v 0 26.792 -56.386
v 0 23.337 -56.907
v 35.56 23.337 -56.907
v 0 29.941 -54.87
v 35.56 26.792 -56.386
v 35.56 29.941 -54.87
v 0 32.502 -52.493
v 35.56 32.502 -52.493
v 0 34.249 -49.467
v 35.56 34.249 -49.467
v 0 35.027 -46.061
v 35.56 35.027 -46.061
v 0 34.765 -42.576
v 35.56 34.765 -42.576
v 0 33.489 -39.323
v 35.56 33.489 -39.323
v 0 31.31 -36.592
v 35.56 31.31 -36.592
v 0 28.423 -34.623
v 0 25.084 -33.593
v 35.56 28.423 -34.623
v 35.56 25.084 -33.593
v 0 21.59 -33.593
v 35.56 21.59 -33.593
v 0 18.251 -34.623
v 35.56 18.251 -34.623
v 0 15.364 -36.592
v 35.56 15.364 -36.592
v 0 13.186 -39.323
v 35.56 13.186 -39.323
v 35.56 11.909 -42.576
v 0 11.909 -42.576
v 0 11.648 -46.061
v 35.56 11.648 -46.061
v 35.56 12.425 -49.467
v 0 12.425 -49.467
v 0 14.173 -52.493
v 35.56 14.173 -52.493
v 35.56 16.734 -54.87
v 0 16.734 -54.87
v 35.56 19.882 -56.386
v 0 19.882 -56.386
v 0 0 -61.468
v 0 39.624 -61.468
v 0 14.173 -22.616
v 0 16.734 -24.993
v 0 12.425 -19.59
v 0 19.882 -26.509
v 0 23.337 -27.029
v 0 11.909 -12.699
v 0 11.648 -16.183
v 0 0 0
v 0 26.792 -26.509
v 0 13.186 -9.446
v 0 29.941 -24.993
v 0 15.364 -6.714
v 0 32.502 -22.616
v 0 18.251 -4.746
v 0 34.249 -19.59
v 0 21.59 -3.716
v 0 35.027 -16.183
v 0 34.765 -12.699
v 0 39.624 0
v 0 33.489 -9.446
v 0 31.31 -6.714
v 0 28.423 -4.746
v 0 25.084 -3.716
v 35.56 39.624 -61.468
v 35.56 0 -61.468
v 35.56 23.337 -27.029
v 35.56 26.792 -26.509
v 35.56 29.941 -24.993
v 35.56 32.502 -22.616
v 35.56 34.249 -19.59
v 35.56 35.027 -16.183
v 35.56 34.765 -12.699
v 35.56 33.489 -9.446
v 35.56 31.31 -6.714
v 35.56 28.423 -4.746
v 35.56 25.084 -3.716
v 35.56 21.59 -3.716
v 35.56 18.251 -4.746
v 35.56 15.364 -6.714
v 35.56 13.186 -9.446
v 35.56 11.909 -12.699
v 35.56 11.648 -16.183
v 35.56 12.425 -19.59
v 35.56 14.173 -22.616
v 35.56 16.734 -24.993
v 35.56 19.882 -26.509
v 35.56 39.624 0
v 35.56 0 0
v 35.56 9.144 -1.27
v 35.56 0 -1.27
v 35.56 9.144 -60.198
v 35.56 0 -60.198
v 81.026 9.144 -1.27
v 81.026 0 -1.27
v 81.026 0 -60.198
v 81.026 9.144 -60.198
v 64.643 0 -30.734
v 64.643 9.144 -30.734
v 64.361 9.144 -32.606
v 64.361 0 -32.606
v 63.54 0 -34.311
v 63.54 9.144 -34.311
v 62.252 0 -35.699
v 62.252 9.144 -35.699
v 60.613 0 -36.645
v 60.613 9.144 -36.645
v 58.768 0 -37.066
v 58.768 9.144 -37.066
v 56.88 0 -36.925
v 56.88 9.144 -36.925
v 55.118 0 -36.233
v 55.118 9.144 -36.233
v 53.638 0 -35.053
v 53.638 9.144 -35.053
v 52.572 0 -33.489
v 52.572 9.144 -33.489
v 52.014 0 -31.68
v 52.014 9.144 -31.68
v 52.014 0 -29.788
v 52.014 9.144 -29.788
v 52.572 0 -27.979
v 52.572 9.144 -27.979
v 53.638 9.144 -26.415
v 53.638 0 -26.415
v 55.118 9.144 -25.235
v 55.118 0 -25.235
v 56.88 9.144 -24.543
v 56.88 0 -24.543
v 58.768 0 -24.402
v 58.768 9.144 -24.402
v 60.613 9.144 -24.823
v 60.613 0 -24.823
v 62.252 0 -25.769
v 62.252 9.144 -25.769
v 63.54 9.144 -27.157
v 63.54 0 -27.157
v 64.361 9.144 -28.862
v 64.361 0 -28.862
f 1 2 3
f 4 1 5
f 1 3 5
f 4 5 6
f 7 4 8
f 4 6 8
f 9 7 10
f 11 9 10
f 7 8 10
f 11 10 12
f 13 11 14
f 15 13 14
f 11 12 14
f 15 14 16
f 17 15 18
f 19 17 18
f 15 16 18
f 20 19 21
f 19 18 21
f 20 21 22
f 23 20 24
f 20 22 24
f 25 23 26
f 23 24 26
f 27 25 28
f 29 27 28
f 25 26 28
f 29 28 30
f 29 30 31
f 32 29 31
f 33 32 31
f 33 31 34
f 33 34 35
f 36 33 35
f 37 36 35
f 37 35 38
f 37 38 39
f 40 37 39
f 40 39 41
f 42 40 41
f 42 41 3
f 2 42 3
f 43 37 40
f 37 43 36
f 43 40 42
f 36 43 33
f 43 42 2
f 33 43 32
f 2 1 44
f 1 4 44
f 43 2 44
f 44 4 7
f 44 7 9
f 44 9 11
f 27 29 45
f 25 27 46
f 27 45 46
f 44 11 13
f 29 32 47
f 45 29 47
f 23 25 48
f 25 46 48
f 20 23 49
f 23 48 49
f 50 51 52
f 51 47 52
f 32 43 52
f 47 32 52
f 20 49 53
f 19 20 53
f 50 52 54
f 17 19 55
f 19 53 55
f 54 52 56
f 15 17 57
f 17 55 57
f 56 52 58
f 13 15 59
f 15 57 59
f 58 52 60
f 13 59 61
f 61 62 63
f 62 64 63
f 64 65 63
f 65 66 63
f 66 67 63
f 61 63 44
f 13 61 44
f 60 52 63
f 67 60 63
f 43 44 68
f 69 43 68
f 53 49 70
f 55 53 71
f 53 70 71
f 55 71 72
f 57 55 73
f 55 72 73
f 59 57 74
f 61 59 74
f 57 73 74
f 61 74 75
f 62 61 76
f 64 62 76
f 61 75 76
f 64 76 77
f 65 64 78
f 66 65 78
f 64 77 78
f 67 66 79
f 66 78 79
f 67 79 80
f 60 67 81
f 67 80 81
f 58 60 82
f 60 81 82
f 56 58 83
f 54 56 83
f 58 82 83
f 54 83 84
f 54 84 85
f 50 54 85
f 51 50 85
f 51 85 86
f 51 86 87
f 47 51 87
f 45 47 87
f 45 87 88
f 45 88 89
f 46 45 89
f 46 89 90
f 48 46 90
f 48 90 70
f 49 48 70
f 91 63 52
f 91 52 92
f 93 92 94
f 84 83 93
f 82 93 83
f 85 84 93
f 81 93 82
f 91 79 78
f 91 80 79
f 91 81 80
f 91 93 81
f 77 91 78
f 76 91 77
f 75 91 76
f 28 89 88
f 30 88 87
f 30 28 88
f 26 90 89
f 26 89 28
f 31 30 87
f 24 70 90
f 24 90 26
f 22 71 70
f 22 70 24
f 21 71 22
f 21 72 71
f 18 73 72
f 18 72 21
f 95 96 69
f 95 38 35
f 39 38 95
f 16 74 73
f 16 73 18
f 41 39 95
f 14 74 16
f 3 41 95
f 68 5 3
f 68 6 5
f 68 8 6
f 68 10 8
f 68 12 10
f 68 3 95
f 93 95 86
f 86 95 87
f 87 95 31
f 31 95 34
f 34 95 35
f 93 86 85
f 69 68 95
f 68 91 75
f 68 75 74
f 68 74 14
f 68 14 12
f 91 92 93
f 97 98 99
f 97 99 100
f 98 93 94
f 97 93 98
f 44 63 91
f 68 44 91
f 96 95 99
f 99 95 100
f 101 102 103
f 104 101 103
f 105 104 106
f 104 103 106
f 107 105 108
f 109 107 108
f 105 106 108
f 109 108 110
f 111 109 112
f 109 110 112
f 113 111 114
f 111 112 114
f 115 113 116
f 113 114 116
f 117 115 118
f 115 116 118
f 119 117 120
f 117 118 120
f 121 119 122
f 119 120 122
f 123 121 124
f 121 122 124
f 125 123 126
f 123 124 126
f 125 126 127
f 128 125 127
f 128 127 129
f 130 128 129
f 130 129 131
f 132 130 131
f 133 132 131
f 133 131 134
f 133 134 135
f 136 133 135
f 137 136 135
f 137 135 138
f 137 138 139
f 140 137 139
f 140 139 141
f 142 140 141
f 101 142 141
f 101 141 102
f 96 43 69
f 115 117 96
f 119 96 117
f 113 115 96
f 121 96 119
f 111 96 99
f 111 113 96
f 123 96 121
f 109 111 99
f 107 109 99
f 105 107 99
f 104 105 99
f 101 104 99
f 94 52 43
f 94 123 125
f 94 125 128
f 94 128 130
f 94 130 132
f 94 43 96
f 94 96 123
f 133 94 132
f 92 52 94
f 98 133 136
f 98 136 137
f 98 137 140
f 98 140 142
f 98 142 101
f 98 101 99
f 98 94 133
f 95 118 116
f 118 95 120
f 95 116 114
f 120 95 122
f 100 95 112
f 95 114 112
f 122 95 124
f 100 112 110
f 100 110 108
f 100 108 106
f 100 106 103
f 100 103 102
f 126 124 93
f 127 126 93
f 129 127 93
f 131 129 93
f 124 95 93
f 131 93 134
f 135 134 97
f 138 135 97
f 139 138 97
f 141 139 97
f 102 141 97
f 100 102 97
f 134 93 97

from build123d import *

# Parameters (mm, degrees)
SKETCH1_W           = 81.026
SKETCH1_H           = 39.624
BOSS_EXTRUDE1_DEPTH = 61.468
SKETCH5_W           = 45.466
SKETCH5_H           = 30.48
CUT_EXTRUDE1_DEPTH  = 62.468
SKETCH6_W           = 45.466
SKETCH6_H           = 1.27
CUT_EXTRUDE2_DEPTH  = 10.144
SKETCH7_R           = 6.35
CUT_EXTRUDE3_DEPTH  = 10.144
SKETCH8_R           = 11.7221
CUT_EXTRUDE4_DEPTH  = 36.56


with BuildPart() as part:
    # Sketch1 → Boss-Extrude1 (new body)
    with BuildSketch(Plane.XY):
        with Locations((40.513, 19.812)):
            Rectangle(SKETCH1_W, SKETCH1_H)
    extrude(amount=-BOSS_EXTRUDE1_DEPTH)

    # Sketch5 → Cut-Extrude1 (cut, through all)
    with BuildSketch(Plane.XY):
        with Locations((58.293, 24.384)):
            Rectangle(SKETCH5_W, SKETCH5_H)
    extrude(amount=-CUT_EXTRUDE1_DEPTH, mode=Mode.SUBTRACT)

    # Sketch6 → Cut-Extrude2 (cut, through all)
    with BuildSketch(Plane(origin=(0, 9.144, 0), x_dir=(1, 0, 0), z_dir=(0, 1, 0))):
        with Locations((58.293, 0.635)):
            Rectangle(SKETCH6_W, SKETCH6_H)
        with Locations((58.293, 60.833)):
            Rectangle(SKETCH6_W, SKETCH6_H)
    extrude(amount=-CUT_EXTRUDE2_DEPTH, mode=Mode.SUBTRACT)

    # Sketch7 → Cut-Extrude3 (cut, through all)
    with BuildSketch(Plane(origin=(0, 9.144, 0), x_dir=(1, 0, 0), z_dir=(0, 1, 0))):
        with Locations((58.293, 30.734)):
            Circle(SKETCH7_R)
    extrude(amount=-CUT_EXTRUDE3_DEPTH, mode=Mode.SUBTRACT)

    # Sketch8 → Cut-Extrude4 (cut, through all)
    with BuildSketch(Plane(origin=(35.56, 0, 0), x_dir=(0, 0, -1), z_dir=(1, 0, 0))):
        with Locations((15.307348572, 23.33723476)):
            Circle(SKETCH8_R)
        with Locations((45.18450858, 23.33723476)):
            Circle(SKETCH8_R)
    extrude(amount=-CUT_EXTRUDE4_DEPTH, mode=Mode.SUBTRACT)


solid = part.part
